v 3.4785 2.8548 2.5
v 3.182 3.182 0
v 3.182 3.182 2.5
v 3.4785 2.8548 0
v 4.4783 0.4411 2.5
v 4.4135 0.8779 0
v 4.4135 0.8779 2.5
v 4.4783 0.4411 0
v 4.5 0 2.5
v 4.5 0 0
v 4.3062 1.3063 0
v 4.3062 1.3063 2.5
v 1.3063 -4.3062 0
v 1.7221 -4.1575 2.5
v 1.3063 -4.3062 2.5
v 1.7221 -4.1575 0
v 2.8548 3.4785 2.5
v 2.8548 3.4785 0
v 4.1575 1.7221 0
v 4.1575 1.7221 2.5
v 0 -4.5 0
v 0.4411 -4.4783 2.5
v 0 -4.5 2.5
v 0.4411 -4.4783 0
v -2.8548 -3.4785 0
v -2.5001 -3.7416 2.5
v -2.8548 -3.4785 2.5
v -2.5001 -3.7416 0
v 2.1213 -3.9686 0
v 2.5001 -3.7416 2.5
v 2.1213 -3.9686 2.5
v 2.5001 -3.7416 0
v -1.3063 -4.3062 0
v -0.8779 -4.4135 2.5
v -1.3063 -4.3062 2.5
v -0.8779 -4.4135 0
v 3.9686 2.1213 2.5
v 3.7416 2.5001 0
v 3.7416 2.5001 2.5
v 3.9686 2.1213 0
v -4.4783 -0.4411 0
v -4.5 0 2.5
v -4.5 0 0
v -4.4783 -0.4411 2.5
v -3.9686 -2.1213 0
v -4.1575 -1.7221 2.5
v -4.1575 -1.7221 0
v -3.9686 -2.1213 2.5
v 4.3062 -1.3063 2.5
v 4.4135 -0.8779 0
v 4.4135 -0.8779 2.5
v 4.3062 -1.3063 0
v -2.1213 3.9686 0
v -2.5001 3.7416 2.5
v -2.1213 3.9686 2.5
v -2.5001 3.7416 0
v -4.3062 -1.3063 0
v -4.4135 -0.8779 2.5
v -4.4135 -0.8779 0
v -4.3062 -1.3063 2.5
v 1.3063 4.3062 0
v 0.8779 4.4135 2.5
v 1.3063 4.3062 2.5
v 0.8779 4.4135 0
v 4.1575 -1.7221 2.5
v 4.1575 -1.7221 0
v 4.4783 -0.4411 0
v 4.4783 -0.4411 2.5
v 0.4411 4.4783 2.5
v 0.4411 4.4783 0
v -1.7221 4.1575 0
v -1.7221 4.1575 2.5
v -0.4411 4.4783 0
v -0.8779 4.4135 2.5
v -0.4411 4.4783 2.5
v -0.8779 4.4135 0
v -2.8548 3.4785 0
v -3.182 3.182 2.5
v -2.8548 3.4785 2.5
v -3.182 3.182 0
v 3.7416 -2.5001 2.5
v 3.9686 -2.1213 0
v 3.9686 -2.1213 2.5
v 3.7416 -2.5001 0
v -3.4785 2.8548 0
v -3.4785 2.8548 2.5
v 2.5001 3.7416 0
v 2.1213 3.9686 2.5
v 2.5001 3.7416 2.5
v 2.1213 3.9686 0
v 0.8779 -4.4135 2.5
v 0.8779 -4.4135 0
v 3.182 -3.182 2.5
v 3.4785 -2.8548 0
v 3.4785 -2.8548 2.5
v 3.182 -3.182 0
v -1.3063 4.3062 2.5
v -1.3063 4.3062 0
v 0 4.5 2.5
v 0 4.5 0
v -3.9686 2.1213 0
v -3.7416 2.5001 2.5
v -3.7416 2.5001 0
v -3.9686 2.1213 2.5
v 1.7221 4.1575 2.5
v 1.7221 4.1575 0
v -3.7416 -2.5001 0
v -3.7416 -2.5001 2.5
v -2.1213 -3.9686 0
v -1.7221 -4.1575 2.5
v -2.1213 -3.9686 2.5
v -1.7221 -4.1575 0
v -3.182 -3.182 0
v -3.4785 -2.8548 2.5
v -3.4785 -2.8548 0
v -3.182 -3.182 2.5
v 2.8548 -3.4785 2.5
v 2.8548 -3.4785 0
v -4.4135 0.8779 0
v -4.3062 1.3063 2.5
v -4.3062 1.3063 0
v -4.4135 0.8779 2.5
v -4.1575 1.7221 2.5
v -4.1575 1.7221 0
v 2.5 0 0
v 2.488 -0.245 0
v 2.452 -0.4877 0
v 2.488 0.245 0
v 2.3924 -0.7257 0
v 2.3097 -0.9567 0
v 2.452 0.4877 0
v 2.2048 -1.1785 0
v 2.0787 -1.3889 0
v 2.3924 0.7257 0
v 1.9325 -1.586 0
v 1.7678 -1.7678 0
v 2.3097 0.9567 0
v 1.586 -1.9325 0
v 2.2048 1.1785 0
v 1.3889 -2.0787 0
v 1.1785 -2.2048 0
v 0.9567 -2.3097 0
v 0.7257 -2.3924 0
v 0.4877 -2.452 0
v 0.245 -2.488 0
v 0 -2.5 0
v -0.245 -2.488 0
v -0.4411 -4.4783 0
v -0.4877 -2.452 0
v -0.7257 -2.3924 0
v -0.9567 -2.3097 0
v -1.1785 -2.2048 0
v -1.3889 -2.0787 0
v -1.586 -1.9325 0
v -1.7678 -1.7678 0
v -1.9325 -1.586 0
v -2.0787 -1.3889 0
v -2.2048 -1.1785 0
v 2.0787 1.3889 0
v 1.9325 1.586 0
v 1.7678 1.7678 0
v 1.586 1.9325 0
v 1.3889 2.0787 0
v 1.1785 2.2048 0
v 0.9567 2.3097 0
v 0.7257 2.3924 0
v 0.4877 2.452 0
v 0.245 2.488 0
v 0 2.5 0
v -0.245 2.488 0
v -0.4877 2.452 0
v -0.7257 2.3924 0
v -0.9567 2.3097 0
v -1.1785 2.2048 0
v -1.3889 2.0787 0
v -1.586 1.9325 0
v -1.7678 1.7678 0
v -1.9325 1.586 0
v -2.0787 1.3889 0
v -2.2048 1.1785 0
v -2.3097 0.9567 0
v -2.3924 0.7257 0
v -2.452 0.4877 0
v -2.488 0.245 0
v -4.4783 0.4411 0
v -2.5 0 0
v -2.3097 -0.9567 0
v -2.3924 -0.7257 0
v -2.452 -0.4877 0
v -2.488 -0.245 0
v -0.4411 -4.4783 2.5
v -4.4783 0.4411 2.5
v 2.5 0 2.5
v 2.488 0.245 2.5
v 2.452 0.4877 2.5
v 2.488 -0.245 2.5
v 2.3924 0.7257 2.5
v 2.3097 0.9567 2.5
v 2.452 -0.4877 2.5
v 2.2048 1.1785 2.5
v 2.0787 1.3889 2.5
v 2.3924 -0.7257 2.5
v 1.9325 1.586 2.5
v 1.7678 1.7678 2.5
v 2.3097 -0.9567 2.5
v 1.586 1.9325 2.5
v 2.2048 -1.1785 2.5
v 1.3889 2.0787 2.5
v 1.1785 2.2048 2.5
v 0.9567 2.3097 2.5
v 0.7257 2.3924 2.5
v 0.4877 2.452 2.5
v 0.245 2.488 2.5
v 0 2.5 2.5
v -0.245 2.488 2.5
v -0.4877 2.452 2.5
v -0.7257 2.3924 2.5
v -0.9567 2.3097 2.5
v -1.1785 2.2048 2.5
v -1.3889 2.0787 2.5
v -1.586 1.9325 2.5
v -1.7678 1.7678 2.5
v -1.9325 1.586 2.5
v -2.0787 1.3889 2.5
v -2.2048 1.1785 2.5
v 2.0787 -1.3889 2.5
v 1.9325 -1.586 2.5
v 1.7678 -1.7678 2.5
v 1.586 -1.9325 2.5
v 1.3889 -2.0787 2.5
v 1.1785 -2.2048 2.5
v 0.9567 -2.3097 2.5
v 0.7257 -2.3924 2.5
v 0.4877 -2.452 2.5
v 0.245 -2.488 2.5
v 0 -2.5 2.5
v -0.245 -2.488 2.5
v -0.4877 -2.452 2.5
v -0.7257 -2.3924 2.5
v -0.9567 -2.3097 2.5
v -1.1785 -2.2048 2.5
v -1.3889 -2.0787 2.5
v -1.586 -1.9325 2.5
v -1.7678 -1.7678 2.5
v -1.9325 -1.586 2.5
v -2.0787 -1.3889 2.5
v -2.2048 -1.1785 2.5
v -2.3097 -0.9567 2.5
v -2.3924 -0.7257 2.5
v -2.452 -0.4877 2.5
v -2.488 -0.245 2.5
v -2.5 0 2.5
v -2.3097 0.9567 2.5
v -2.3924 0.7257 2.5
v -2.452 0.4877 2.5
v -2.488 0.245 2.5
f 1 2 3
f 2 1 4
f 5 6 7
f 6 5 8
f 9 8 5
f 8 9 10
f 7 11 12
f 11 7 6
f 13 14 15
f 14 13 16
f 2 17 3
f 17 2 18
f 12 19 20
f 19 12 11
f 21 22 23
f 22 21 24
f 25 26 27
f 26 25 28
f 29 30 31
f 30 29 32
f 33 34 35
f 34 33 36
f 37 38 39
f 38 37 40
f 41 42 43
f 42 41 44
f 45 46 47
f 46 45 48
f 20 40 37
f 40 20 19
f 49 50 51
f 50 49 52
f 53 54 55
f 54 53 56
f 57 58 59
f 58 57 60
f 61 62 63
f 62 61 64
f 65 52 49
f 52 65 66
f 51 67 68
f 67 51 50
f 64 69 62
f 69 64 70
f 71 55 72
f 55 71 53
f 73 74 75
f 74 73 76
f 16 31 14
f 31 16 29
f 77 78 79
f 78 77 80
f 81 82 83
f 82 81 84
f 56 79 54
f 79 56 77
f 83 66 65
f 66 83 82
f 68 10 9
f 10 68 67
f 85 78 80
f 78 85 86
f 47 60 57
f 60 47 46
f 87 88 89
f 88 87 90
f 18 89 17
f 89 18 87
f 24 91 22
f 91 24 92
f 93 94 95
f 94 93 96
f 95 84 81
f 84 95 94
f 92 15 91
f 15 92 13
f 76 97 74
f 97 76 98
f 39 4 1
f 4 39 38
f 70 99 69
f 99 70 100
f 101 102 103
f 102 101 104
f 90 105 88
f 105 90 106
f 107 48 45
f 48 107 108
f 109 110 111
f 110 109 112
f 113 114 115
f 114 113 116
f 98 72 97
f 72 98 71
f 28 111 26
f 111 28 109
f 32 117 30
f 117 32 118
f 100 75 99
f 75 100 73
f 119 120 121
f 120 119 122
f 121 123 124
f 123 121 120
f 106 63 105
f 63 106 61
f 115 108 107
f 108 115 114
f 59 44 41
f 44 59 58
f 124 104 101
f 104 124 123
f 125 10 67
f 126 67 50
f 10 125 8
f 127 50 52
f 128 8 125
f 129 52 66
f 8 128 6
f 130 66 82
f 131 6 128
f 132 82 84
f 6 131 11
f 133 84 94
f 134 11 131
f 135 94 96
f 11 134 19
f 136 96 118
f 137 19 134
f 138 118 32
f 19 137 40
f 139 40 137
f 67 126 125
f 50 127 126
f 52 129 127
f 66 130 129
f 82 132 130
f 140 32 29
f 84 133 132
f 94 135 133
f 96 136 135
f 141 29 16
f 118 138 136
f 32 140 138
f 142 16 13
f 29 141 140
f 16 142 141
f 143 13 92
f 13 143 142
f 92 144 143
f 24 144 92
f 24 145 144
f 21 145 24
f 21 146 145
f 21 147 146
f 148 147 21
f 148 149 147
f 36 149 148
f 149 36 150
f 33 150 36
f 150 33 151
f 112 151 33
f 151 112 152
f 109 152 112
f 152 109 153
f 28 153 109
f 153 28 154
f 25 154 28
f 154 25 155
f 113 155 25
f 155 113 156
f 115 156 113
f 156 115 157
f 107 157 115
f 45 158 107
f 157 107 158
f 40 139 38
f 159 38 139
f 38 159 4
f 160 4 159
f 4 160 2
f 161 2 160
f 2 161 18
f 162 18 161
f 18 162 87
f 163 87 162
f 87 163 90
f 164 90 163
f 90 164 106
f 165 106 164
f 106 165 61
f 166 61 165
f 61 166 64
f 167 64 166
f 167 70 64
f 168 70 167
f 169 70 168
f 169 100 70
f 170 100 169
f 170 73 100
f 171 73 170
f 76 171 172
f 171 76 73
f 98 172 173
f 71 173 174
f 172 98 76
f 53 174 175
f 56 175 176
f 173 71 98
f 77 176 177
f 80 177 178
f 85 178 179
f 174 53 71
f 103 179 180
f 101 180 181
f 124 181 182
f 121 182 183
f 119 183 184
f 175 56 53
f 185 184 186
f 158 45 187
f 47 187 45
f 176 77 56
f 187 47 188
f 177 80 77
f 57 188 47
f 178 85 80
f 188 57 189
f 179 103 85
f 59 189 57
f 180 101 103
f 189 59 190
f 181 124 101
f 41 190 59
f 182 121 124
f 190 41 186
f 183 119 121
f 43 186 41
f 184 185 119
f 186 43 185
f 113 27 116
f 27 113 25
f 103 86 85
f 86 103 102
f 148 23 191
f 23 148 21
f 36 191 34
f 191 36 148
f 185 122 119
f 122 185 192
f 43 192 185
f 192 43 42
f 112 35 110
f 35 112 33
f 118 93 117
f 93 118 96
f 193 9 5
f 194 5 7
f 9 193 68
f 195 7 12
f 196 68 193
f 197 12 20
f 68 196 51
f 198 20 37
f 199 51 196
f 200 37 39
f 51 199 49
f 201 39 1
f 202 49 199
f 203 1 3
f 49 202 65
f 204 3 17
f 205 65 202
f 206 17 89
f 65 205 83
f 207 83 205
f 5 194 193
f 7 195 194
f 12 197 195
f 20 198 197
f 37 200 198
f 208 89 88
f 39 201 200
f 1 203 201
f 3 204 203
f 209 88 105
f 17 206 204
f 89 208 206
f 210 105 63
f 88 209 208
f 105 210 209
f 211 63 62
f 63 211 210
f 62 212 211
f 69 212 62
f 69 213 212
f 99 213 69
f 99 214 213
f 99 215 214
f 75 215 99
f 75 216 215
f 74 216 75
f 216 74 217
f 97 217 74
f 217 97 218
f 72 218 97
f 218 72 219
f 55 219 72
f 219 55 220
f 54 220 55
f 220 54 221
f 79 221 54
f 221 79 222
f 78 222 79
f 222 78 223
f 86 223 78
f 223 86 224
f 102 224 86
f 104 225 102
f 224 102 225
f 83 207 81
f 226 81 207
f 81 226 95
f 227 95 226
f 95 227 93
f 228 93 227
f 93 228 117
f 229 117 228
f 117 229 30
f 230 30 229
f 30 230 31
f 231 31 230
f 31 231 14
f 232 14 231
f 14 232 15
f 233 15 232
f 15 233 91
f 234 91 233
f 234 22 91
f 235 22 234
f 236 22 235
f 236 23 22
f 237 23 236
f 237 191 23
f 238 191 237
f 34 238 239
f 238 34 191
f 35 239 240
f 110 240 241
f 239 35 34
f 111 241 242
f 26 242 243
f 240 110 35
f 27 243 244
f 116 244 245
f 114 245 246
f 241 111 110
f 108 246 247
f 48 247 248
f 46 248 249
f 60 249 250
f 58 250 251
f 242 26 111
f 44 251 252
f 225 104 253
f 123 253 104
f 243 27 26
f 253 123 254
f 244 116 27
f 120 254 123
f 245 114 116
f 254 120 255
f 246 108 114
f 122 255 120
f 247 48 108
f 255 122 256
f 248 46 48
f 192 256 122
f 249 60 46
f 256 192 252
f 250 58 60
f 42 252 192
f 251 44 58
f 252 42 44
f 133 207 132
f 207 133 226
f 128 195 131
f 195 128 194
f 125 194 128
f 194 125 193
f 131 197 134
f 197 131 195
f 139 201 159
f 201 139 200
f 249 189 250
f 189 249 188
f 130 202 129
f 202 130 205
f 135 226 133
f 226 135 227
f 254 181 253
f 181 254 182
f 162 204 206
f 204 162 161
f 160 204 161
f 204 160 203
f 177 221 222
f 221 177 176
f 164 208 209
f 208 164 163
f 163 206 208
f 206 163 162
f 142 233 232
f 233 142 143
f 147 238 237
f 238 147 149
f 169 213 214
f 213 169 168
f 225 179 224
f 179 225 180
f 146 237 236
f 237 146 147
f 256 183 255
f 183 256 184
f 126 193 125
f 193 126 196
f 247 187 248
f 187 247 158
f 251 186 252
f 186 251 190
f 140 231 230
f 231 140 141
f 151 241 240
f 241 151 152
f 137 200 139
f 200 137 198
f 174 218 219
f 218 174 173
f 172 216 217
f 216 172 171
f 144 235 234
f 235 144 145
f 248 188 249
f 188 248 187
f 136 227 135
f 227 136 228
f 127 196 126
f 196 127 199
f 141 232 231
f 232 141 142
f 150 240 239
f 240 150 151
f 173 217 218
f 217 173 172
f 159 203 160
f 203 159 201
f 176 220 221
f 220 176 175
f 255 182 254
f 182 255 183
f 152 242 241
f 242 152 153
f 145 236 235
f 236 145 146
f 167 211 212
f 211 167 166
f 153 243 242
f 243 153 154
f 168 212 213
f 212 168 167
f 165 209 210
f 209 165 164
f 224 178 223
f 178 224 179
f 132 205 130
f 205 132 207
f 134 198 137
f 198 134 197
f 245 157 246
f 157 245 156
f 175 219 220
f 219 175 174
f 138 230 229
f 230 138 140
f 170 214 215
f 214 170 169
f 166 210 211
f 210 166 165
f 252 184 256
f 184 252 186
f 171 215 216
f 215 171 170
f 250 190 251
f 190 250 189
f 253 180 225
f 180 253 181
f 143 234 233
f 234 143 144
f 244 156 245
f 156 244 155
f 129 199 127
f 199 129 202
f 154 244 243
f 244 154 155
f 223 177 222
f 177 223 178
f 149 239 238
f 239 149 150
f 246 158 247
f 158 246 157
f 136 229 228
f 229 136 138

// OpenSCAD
module ball_bearing() {
    difference() {
        // Outer cylinder
        cylinder(d=9.0, h=2.5, $fn=64);
        // Inner bore
        translate([0, 0, -1])
            cylinder(d=5.0, h=4.5, $fn=64);
    }
}

ball_bearing();
